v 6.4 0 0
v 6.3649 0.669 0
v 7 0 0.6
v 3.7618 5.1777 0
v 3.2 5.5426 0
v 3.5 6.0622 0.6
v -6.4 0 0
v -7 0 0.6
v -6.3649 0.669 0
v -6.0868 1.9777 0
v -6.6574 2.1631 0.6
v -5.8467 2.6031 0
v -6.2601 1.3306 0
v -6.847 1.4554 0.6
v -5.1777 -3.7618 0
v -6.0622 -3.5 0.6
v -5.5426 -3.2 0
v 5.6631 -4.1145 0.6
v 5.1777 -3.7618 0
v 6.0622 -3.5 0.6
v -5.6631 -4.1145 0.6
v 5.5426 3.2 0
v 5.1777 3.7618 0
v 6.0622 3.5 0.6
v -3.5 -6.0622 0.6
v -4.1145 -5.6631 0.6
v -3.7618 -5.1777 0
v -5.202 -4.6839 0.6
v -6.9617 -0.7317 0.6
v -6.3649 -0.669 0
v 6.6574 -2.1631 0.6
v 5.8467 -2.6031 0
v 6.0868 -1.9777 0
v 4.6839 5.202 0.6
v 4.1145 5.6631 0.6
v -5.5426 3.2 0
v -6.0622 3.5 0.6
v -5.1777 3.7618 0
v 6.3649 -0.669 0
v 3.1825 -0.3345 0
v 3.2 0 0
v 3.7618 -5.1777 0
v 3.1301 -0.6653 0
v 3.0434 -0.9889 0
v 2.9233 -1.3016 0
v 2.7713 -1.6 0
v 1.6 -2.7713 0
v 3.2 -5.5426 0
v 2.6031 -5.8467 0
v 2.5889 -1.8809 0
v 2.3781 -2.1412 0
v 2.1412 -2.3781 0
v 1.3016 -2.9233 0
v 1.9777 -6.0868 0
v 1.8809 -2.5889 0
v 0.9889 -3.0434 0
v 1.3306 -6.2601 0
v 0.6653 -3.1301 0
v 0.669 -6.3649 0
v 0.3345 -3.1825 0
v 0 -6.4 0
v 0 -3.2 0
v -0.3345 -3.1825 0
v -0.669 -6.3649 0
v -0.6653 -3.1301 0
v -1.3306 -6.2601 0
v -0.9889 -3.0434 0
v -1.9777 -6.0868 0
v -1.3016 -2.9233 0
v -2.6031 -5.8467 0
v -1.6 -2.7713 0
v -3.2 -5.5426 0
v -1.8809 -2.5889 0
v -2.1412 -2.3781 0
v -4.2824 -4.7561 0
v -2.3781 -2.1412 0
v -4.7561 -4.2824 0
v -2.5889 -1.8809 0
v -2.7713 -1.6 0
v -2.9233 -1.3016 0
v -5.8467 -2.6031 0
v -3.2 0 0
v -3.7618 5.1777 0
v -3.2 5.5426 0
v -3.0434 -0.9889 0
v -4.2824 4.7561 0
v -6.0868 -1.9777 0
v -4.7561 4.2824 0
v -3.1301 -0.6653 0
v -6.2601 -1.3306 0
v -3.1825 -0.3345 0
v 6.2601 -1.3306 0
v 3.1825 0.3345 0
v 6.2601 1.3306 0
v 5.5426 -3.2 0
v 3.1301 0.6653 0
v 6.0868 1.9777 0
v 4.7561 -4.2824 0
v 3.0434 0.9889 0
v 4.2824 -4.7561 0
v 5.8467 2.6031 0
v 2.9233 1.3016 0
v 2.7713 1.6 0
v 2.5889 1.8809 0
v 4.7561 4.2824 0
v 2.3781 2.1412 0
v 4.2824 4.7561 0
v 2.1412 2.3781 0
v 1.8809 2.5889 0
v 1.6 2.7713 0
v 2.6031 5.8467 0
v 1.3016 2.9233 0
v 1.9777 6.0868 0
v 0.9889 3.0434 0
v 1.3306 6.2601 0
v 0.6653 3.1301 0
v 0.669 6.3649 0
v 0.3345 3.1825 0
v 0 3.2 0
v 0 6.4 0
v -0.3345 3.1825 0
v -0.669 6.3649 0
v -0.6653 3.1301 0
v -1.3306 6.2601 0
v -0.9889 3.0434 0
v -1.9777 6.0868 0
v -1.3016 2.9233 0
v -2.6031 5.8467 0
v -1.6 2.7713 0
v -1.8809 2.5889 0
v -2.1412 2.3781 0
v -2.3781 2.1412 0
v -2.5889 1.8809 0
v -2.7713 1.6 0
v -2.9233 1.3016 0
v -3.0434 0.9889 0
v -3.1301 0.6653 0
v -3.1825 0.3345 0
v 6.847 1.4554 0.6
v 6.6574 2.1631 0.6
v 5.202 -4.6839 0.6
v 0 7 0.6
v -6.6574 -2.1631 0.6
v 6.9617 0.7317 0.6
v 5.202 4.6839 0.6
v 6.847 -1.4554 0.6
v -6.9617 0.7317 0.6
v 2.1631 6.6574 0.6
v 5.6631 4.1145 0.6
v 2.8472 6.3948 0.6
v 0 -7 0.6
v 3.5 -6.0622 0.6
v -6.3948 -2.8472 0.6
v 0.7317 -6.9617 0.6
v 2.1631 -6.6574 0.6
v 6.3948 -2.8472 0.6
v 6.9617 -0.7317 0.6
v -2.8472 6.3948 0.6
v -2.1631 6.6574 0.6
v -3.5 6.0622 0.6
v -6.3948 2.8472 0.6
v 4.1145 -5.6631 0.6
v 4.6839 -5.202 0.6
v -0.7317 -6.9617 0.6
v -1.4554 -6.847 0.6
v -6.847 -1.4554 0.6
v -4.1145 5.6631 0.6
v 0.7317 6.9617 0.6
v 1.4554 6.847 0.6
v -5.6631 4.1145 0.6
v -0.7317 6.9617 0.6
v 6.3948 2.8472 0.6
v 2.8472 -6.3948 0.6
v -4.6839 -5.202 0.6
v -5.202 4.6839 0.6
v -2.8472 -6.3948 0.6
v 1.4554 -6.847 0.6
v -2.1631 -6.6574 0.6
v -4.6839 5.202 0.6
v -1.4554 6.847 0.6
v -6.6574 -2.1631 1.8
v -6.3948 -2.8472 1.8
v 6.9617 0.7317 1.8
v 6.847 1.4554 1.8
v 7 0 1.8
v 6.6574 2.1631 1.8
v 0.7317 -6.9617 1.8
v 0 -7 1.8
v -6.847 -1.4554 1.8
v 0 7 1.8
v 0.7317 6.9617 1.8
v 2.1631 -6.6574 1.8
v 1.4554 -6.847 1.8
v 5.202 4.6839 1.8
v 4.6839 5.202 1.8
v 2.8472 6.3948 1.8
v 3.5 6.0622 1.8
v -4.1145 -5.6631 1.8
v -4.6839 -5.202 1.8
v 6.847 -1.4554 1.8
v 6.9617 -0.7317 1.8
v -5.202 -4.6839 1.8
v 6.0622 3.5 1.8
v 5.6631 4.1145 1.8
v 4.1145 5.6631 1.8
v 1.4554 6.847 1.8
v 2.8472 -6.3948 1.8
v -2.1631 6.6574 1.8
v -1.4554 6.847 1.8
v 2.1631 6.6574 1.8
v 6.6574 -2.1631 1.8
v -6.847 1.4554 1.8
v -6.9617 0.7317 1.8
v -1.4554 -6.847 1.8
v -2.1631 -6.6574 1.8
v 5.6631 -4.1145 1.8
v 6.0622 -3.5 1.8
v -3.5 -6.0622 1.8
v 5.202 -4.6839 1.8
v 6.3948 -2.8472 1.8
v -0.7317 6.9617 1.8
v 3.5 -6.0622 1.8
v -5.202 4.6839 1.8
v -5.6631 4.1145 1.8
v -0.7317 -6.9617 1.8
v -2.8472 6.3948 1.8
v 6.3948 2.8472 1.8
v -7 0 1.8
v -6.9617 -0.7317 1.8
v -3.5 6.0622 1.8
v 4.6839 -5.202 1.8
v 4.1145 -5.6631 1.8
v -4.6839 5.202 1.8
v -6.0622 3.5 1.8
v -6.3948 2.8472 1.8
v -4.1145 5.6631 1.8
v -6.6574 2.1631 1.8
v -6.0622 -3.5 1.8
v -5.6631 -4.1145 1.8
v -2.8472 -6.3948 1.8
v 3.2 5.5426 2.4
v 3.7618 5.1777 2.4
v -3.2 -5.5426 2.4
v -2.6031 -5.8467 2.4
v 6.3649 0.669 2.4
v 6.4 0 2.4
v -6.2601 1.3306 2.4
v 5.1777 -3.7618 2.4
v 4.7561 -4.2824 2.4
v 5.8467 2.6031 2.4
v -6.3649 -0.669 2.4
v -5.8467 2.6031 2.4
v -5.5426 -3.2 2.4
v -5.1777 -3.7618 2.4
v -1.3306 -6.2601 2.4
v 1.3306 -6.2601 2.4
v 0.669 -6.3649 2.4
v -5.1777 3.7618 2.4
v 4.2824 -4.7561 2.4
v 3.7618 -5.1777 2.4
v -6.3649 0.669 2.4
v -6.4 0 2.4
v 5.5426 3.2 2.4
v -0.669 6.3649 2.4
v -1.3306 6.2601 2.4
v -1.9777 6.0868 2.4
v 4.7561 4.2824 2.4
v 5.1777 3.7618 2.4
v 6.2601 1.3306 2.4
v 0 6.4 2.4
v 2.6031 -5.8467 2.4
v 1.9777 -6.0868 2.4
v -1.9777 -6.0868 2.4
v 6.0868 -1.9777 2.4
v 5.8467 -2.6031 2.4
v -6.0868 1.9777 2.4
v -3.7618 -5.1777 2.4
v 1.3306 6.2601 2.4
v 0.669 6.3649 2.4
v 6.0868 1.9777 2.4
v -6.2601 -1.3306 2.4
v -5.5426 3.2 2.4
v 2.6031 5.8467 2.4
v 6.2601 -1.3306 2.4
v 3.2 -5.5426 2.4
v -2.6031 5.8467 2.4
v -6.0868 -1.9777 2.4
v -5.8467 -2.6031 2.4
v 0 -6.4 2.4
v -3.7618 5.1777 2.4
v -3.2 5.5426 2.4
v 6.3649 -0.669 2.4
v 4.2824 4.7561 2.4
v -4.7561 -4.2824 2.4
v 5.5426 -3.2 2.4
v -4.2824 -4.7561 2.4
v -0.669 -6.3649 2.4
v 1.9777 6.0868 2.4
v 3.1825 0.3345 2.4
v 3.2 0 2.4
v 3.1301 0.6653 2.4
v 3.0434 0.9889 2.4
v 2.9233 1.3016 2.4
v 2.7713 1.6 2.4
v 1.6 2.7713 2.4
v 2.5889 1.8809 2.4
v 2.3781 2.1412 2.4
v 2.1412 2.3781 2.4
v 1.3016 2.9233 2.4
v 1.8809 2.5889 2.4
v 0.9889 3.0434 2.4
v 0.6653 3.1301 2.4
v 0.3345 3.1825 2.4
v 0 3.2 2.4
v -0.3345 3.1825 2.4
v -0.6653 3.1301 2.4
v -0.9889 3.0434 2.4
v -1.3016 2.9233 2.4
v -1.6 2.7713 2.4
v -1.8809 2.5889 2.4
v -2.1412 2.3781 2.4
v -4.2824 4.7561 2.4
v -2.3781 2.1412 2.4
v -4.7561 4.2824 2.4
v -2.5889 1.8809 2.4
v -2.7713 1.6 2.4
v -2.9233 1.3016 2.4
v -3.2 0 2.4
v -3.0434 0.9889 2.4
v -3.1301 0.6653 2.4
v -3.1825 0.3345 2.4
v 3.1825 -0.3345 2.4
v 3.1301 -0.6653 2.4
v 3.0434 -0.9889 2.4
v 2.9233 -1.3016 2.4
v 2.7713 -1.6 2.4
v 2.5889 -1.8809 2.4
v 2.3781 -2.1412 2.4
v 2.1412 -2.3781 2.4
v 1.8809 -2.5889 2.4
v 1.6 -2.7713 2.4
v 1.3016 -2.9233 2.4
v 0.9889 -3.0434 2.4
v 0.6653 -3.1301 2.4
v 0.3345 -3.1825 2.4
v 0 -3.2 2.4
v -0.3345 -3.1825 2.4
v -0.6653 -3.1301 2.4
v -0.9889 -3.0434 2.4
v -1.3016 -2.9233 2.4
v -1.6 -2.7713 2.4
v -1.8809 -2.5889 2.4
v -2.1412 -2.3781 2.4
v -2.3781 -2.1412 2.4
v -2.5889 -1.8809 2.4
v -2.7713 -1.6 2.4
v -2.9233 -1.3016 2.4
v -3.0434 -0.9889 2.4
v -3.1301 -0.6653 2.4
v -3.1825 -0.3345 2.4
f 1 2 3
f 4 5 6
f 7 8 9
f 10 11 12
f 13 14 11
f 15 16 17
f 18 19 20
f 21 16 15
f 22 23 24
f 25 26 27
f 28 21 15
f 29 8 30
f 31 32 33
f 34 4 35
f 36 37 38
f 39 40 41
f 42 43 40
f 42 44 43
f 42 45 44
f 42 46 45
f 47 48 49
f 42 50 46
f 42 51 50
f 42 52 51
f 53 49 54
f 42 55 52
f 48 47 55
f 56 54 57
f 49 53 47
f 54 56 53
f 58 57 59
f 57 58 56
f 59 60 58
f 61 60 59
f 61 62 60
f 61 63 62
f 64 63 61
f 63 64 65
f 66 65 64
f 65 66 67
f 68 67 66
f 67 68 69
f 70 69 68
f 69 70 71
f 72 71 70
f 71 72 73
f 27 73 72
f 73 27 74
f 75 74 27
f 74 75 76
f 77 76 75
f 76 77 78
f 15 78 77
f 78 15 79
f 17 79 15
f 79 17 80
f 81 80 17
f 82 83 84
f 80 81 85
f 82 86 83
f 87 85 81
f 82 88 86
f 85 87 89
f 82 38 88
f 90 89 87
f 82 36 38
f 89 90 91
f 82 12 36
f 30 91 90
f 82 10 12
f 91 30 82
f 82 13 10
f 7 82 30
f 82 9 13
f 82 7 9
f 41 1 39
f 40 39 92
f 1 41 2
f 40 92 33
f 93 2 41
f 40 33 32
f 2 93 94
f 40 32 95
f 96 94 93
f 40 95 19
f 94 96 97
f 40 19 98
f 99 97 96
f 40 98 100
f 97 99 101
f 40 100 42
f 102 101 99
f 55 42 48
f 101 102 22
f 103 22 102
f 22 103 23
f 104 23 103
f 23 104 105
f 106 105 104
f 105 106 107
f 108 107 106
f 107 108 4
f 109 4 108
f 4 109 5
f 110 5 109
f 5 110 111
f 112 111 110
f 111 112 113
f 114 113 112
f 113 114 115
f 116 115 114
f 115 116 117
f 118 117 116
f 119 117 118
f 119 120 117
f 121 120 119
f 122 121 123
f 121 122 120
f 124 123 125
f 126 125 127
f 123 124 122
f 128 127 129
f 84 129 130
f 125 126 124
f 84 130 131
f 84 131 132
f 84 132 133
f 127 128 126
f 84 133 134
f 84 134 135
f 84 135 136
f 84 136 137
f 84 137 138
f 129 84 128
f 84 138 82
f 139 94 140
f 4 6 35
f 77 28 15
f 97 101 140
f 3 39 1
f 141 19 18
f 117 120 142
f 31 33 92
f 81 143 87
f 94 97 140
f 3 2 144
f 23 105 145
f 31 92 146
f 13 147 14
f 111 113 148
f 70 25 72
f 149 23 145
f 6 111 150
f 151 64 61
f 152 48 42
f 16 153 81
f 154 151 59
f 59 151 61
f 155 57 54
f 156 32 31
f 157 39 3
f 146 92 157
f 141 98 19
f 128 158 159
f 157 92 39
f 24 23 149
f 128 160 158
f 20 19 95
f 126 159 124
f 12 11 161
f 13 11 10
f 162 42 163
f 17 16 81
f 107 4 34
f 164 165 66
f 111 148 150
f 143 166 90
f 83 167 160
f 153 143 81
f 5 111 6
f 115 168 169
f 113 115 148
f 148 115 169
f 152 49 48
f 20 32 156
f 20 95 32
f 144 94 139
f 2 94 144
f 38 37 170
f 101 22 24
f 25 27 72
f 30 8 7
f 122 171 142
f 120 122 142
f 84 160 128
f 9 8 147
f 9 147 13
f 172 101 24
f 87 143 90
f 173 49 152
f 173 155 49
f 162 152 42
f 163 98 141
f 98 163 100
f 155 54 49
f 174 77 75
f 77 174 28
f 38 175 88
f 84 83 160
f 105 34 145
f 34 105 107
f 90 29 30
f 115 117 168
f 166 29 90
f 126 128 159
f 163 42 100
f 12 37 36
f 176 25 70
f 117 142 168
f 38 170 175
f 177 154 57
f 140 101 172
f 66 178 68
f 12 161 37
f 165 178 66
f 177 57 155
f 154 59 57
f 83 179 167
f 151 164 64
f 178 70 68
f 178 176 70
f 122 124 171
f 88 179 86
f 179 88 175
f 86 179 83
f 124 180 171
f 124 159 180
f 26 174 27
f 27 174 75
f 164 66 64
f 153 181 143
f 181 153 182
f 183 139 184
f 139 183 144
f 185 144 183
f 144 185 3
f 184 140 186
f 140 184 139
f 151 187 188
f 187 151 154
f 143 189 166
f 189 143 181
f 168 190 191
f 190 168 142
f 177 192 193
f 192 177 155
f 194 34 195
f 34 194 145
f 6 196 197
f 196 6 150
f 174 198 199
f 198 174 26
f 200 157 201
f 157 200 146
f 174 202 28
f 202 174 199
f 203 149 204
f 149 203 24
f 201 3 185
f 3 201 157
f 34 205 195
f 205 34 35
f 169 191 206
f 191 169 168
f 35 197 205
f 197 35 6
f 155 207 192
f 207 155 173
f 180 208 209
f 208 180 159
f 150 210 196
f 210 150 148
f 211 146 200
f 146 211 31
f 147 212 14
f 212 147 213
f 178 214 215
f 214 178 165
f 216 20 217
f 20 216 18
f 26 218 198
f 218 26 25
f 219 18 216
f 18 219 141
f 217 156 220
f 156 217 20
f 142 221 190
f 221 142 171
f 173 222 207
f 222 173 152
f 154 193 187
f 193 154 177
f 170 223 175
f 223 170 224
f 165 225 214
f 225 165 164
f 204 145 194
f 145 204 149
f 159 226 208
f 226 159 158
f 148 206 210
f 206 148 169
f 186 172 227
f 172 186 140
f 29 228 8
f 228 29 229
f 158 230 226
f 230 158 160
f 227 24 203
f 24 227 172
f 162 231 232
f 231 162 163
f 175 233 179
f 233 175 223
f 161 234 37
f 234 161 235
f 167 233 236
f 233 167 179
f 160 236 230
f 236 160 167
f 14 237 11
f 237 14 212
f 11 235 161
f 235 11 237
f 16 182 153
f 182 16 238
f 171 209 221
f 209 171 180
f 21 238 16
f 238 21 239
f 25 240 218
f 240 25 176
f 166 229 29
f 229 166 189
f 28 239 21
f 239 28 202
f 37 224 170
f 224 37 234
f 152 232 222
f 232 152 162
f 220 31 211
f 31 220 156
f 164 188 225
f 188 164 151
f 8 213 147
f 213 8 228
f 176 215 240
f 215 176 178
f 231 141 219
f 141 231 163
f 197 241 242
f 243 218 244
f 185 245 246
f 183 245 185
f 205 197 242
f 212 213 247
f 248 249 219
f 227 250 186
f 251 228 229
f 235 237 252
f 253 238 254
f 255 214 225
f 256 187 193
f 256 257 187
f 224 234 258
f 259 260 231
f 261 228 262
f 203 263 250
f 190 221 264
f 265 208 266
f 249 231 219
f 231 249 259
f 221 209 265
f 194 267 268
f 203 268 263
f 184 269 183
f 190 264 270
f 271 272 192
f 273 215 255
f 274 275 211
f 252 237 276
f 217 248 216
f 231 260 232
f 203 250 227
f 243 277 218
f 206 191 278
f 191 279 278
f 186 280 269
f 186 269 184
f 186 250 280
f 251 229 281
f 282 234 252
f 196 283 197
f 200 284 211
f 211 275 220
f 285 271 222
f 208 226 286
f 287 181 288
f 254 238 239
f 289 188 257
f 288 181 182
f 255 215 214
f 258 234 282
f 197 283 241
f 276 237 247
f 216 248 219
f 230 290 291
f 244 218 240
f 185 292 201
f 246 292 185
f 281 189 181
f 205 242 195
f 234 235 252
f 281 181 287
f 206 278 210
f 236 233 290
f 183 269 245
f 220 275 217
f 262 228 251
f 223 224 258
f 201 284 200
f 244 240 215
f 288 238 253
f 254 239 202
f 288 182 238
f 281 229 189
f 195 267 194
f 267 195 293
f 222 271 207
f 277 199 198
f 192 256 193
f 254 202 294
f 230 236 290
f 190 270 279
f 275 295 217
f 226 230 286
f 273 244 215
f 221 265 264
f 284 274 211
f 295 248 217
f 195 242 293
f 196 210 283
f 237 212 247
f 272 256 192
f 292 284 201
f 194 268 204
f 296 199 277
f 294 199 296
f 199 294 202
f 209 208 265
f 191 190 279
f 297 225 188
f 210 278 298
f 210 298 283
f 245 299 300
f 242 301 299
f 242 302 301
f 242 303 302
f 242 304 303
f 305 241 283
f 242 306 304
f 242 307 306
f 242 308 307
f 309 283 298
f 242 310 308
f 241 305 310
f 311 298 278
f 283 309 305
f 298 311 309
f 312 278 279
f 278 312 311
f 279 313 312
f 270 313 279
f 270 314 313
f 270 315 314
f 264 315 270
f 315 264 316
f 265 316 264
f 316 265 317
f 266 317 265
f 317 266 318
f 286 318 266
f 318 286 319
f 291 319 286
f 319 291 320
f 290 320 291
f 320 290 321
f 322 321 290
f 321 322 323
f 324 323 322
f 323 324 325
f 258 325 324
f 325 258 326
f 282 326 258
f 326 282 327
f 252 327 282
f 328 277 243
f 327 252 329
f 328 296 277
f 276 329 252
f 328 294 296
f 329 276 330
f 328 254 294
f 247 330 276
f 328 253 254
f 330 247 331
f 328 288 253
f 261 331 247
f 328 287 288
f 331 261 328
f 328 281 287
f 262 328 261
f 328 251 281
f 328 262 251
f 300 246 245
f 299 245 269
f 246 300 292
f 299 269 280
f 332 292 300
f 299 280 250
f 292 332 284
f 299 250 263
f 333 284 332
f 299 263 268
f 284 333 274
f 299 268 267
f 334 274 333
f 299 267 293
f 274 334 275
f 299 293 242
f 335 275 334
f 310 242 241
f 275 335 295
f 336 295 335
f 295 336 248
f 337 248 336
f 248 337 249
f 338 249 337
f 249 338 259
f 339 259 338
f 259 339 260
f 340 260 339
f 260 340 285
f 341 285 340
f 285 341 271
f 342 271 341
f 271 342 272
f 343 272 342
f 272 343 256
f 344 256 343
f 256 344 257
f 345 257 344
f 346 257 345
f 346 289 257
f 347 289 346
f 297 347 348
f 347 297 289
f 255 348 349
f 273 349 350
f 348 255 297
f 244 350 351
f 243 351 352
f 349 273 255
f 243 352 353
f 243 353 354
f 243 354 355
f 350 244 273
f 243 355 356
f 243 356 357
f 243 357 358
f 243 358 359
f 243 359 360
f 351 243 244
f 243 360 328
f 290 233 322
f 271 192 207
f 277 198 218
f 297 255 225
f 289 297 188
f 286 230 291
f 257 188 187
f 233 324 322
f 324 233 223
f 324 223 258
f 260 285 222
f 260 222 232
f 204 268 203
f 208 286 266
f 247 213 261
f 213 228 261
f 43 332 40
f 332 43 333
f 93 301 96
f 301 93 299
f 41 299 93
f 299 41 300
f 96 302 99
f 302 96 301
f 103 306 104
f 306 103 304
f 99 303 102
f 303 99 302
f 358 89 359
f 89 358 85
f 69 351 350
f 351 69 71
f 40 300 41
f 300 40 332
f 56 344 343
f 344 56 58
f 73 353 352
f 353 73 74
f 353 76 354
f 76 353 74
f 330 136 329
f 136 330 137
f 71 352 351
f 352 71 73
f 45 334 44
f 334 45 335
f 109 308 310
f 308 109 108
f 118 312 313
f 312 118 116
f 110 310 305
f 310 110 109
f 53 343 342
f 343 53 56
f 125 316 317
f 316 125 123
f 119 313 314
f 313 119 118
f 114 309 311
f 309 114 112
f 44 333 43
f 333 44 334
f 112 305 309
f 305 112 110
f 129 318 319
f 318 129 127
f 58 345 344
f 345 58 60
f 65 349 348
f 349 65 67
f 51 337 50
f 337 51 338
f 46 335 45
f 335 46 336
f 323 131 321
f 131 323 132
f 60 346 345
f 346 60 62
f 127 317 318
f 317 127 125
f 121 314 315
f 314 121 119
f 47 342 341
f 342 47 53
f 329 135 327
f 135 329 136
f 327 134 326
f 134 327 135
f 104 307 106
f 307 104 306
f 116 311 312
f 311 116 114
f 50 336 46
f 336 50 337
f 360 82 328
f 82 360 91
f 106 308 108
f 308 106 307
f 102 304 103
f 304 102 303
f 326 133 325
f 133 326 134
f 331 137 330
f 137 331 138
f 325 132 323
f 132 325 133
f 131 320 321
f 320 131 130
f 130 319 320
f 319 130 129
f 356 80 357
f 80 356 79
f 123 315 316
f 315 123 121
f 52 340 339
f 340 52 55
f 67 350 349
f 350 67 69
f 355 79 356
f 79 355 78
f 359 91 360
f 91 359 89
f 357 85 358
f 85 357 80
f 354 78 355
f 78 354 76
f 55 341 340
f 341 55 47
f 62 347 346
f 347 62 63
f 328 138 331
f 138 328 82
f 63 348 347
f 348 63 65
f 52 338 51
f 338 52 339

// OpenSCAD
// Chamfered metric washer.
$fn = 60;
eps = 0.02;
inner_d = 6.4;
outer_d = 14;
thickness = 2.4;
chamfer = 0.6;
difference() {
    union() {
        cylinder(d1 = outer_d - 2 * chamfer, d2 = outer_d, h = chamfer);
        translate([0, 0, chamfer]) cylinder(d = outer_d, h = thickness - 2 * chamfer);
        translate([0, 0, thickness - chamfer]) cylinder(d1 = outer_d, d2 = outer_d - 2 * chamfer, h = chamfer);
    }
    translate([0, 0, -eps]) cylinder(d = inner_d, h = thickness + 2 * eps);
}
